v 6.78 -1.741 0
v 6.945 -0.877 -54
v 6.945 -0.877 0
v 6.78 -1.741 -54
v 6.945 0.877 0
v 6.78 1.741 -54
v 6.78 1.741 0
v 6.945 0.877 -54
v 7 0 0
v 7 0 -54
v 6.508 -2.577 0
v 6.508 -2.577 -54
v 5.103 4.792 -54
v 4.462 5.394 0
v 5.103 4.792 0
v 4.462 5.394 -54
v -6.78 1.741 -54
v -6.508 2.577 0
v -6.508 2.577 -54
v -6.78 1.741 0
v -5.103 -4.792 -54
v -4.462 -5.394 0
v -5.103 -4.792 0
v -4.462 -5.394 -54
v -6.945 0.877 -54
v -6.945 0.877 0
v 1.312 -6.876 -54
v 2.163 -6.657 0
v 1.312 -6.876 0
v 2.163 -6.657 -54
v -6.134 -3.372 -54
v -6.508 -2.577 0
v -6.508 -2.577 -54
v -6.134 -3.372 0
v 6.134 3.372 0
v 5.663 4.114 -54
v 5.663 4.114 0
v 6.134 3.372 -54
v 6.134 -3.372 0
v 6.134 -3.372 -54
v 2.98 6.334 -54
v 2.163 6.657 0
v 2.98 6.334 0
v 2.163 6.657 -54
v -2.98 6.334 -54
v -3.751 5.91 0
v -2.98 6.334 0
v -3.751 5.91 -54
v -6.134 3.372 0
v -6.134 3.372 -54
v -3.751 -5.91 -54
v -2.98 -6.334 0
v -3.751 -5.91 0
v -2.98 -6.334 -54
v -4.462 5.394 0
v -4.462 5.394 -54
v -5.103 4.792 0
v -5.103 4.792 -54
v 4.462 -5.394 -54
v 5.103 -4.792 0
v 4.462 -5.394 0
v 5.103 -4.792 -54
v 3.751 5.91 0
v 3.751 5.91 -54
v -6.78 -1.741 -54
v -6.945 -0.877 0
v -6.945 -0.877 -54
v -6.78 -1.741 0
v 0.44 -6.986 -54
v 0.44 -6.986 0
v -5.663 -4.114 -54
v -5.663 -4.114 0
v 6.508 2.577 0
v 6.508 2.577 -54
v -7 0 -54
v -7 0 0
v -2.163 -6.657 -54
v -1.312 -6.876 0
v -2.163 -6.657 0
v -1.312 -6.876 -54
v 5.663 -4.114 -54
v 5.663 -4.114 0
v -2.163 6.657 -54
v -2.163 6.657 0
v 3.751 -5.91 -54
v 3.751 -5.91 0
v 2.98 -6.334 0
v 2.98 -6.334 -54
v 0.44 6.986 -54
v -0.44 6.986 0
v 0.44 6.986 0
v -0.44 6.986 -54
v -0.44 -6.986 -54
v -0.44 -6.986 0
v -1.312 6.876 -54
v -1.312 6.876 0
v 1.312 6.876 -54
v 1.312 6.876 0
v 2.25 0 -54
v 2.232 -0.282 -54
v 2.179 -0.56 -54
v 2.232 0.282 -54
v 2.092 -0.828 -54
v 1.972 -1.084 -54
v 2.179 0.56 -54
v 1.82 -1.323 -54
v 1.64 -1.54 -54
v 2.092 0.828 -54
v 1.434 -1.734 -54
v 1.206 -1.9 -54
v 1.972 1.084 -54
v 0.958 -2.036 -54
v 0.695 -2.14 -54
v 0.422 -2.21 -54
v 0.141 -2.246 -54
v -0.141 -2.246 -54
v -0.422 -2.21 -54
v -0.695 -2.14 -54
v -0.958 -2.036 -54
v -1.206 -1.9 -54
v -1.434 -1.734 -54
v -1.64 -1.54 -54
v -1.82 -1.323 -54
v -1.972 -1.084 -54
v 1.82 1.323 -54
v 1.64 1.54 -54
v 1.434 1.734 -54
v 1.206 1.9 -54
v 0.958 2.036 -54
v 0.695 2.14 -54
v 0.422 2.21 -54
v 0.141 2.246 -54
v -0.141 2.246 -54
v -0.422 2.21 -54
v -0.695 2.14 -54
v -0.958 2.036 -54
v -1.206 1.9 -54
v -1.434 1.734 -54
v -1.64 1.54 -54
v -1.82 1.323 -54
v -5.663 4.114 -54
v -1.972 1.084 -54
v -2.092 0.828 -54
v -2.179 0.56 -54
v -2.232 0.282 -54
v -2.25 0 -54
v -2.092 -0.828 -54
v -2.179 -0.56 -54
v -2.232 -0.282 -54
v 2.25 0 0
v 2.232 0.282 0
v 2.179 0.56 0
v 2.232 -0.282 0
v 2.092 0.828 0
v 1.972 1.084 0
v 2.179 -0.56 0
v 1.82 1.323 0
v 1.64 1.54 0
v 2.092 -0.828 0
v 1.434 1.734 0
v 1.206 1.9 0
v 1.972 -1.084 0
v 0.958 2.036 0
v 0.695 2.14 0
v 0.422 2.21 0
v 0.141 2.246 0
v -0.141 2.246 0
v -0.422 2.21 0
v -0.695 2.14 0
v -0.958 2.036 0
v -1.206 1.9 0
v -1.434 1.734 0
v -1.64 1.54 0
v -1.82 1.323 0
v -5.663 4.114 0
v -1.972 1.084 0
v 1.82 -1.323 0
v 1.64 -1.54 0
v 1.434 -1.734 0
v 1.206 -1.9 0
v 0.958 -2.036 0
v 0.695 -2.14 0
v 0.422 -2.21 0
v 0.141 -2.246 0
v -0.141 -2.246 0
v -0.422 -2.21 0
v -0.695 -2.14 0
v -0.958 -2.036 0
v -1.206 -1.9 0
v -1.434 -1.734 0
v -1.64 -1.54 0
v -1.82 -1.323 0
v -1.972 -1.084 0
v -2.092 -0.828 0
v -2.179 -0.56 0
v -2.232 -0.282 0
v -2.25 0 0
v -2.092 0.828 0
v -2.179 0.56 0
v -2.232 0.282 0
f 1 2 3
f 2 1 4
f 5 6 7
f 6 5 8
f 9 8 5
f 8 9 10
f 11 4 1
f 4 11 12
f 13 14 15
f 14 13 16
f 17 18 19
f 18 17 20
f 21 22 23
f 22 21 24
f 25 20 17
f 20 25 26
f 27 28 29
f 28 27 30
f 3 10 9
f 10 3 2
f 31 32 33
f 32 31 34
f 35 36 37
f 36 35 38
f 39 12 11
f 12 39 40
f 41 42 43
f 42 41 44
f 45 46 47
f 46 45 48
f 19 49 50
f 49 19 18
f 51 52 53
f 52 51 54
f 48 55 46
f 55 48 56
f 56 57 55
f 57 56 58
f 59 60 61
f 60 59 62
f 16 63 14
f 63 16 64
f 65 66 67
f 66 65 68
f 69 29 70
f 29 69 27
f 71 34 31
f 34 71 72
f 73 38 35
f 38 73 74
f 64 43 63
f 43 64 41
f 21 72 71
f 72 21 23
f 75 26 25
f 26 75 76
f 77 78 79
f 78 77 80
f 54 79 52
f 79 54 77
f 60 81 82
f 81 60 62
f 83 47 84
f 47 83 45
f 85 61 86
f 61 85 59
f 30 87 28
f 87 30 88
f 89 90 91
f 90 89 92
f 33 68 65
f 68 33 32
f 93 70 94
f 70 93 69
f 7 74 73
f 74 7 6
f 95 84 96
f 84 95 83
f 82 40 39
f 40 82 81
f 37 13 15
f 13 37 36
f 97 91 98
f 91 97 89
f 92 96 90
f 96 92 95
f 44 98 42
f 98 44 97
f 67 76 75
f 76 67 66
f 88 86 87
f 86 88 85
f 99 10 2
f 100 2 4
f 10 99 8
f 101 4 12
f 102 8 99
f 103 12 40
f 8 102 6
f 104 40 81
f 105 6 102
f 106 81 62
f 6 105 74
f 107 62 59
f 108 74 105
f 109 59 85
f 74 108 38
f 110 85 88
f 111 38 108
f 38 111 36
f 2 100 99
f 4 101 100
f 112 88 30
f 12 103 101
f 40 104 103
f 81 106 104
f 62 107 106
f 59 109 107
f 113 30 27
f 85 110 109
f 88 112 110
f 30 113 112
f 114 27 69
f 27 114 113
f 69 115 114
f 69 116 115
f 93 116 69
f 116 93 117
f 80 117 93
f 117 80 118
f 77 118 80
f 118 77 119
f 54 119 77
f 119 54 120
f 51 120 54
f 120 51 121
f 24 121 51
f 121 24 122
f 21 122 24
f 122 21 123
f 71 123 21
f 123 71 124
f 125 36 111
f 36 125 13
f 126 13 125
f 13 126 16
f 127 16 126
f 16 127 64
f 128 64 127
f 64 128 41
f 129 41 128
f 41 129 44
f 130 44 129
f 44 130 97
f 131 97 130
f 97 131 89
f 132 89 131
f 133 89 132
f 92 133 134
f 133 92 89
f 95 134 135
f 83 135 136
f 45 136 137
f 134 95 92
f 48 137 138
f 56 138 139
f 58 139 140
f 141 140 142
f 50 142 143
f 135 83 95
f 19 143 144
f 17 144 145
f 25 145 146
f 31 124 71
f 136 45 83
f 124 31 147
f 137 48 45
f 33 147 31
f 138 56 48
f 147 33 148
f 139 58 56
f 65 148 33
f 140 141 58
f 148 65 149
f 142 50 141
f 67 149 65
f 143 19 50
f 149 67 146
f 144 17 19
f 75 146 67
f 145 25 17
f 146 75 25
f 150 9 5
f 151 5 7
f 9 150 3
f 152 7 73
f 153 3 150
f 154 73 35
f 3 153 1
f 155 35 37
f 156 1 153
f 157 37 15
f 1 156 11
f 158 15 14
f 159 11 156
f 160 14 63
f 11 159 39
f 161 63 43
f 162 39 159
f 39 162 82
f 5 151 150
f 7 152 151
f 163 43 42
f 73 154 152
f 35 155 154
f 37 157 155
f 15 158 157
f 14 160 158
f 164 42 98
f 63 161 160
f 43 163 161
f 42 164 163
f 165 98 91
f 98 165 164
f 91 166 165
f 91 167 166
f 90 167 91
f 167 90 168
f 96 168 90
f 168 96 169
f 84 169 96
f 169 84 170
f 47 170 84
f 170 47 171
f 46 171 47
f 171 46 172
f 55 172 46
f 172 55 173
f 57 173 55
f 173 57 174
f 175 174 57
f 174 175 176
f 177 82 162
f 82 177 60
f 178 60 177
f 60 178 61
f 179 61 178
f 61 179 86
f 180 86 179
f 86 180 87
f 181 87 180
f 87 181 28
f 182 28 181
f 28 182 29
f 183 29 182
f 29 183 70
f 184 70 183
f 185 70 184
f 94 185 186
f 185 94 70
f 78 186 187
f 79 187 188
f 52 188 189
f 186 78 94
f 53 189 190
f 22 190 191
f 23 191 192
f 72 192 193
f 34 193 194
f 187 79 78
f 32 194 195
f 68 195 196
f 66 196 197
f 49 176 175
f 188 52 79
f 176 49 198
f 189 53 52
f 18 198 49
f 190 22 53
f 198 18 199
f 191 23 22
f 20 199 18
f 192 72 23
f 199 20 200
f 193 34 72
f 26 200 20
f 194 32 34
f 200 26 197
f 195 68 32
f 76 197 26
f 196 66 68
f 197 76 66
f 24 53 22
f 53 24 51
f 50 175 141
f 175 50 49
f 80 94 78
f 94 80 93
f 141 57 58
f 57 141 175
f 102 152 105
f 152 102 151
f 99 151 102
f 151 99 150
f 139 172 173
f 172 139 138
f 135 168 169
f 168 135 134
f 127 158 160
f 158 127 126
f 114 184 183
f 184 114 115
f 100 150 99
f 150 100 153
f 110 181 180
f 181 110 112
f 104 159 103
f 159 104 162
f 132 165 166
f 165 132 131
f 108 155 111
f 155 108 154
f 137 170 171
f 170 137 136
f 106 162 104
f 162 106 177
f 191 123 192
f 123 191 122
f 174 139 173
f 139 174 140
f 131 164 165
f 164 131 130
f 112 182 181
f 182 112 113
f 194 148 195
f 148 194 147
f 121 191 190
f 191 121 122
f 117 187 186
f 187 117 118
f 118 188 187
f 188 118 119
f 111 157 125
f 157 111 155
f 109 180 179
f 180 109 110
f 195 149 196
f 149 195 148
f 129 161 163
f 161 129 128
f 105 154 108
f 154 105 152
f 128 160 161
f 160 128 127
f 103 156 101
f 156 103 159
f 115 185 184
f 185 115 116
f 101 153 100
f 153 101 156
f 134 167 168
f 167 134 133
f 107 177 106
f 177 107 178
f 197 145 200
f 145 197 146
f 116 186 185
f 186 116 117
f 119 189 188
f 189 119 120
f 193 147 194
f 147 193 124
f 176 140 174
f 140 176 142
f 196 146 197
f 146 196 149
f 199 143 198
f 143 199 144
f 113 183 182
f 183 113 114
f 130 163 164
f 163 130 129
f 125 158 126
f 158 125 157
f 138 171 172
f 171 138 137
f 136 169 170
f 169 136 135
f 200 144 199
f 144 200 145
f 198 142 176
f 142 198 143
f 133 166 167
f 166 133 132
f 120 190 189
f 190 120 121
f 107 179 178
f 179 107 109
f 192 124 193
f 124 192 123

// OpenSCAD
$fn = 50;


difference() {
	union() {
		translate(v = [0, 0, -54.0000000000]) {
			cylinder(h = 54, r = 7.0000000000);
		}
	}
	union() {
		#translate(v = [0, 0, -54]) {
			cylinder(h = 54, r = 2.2500000000);
		}
	}
}
